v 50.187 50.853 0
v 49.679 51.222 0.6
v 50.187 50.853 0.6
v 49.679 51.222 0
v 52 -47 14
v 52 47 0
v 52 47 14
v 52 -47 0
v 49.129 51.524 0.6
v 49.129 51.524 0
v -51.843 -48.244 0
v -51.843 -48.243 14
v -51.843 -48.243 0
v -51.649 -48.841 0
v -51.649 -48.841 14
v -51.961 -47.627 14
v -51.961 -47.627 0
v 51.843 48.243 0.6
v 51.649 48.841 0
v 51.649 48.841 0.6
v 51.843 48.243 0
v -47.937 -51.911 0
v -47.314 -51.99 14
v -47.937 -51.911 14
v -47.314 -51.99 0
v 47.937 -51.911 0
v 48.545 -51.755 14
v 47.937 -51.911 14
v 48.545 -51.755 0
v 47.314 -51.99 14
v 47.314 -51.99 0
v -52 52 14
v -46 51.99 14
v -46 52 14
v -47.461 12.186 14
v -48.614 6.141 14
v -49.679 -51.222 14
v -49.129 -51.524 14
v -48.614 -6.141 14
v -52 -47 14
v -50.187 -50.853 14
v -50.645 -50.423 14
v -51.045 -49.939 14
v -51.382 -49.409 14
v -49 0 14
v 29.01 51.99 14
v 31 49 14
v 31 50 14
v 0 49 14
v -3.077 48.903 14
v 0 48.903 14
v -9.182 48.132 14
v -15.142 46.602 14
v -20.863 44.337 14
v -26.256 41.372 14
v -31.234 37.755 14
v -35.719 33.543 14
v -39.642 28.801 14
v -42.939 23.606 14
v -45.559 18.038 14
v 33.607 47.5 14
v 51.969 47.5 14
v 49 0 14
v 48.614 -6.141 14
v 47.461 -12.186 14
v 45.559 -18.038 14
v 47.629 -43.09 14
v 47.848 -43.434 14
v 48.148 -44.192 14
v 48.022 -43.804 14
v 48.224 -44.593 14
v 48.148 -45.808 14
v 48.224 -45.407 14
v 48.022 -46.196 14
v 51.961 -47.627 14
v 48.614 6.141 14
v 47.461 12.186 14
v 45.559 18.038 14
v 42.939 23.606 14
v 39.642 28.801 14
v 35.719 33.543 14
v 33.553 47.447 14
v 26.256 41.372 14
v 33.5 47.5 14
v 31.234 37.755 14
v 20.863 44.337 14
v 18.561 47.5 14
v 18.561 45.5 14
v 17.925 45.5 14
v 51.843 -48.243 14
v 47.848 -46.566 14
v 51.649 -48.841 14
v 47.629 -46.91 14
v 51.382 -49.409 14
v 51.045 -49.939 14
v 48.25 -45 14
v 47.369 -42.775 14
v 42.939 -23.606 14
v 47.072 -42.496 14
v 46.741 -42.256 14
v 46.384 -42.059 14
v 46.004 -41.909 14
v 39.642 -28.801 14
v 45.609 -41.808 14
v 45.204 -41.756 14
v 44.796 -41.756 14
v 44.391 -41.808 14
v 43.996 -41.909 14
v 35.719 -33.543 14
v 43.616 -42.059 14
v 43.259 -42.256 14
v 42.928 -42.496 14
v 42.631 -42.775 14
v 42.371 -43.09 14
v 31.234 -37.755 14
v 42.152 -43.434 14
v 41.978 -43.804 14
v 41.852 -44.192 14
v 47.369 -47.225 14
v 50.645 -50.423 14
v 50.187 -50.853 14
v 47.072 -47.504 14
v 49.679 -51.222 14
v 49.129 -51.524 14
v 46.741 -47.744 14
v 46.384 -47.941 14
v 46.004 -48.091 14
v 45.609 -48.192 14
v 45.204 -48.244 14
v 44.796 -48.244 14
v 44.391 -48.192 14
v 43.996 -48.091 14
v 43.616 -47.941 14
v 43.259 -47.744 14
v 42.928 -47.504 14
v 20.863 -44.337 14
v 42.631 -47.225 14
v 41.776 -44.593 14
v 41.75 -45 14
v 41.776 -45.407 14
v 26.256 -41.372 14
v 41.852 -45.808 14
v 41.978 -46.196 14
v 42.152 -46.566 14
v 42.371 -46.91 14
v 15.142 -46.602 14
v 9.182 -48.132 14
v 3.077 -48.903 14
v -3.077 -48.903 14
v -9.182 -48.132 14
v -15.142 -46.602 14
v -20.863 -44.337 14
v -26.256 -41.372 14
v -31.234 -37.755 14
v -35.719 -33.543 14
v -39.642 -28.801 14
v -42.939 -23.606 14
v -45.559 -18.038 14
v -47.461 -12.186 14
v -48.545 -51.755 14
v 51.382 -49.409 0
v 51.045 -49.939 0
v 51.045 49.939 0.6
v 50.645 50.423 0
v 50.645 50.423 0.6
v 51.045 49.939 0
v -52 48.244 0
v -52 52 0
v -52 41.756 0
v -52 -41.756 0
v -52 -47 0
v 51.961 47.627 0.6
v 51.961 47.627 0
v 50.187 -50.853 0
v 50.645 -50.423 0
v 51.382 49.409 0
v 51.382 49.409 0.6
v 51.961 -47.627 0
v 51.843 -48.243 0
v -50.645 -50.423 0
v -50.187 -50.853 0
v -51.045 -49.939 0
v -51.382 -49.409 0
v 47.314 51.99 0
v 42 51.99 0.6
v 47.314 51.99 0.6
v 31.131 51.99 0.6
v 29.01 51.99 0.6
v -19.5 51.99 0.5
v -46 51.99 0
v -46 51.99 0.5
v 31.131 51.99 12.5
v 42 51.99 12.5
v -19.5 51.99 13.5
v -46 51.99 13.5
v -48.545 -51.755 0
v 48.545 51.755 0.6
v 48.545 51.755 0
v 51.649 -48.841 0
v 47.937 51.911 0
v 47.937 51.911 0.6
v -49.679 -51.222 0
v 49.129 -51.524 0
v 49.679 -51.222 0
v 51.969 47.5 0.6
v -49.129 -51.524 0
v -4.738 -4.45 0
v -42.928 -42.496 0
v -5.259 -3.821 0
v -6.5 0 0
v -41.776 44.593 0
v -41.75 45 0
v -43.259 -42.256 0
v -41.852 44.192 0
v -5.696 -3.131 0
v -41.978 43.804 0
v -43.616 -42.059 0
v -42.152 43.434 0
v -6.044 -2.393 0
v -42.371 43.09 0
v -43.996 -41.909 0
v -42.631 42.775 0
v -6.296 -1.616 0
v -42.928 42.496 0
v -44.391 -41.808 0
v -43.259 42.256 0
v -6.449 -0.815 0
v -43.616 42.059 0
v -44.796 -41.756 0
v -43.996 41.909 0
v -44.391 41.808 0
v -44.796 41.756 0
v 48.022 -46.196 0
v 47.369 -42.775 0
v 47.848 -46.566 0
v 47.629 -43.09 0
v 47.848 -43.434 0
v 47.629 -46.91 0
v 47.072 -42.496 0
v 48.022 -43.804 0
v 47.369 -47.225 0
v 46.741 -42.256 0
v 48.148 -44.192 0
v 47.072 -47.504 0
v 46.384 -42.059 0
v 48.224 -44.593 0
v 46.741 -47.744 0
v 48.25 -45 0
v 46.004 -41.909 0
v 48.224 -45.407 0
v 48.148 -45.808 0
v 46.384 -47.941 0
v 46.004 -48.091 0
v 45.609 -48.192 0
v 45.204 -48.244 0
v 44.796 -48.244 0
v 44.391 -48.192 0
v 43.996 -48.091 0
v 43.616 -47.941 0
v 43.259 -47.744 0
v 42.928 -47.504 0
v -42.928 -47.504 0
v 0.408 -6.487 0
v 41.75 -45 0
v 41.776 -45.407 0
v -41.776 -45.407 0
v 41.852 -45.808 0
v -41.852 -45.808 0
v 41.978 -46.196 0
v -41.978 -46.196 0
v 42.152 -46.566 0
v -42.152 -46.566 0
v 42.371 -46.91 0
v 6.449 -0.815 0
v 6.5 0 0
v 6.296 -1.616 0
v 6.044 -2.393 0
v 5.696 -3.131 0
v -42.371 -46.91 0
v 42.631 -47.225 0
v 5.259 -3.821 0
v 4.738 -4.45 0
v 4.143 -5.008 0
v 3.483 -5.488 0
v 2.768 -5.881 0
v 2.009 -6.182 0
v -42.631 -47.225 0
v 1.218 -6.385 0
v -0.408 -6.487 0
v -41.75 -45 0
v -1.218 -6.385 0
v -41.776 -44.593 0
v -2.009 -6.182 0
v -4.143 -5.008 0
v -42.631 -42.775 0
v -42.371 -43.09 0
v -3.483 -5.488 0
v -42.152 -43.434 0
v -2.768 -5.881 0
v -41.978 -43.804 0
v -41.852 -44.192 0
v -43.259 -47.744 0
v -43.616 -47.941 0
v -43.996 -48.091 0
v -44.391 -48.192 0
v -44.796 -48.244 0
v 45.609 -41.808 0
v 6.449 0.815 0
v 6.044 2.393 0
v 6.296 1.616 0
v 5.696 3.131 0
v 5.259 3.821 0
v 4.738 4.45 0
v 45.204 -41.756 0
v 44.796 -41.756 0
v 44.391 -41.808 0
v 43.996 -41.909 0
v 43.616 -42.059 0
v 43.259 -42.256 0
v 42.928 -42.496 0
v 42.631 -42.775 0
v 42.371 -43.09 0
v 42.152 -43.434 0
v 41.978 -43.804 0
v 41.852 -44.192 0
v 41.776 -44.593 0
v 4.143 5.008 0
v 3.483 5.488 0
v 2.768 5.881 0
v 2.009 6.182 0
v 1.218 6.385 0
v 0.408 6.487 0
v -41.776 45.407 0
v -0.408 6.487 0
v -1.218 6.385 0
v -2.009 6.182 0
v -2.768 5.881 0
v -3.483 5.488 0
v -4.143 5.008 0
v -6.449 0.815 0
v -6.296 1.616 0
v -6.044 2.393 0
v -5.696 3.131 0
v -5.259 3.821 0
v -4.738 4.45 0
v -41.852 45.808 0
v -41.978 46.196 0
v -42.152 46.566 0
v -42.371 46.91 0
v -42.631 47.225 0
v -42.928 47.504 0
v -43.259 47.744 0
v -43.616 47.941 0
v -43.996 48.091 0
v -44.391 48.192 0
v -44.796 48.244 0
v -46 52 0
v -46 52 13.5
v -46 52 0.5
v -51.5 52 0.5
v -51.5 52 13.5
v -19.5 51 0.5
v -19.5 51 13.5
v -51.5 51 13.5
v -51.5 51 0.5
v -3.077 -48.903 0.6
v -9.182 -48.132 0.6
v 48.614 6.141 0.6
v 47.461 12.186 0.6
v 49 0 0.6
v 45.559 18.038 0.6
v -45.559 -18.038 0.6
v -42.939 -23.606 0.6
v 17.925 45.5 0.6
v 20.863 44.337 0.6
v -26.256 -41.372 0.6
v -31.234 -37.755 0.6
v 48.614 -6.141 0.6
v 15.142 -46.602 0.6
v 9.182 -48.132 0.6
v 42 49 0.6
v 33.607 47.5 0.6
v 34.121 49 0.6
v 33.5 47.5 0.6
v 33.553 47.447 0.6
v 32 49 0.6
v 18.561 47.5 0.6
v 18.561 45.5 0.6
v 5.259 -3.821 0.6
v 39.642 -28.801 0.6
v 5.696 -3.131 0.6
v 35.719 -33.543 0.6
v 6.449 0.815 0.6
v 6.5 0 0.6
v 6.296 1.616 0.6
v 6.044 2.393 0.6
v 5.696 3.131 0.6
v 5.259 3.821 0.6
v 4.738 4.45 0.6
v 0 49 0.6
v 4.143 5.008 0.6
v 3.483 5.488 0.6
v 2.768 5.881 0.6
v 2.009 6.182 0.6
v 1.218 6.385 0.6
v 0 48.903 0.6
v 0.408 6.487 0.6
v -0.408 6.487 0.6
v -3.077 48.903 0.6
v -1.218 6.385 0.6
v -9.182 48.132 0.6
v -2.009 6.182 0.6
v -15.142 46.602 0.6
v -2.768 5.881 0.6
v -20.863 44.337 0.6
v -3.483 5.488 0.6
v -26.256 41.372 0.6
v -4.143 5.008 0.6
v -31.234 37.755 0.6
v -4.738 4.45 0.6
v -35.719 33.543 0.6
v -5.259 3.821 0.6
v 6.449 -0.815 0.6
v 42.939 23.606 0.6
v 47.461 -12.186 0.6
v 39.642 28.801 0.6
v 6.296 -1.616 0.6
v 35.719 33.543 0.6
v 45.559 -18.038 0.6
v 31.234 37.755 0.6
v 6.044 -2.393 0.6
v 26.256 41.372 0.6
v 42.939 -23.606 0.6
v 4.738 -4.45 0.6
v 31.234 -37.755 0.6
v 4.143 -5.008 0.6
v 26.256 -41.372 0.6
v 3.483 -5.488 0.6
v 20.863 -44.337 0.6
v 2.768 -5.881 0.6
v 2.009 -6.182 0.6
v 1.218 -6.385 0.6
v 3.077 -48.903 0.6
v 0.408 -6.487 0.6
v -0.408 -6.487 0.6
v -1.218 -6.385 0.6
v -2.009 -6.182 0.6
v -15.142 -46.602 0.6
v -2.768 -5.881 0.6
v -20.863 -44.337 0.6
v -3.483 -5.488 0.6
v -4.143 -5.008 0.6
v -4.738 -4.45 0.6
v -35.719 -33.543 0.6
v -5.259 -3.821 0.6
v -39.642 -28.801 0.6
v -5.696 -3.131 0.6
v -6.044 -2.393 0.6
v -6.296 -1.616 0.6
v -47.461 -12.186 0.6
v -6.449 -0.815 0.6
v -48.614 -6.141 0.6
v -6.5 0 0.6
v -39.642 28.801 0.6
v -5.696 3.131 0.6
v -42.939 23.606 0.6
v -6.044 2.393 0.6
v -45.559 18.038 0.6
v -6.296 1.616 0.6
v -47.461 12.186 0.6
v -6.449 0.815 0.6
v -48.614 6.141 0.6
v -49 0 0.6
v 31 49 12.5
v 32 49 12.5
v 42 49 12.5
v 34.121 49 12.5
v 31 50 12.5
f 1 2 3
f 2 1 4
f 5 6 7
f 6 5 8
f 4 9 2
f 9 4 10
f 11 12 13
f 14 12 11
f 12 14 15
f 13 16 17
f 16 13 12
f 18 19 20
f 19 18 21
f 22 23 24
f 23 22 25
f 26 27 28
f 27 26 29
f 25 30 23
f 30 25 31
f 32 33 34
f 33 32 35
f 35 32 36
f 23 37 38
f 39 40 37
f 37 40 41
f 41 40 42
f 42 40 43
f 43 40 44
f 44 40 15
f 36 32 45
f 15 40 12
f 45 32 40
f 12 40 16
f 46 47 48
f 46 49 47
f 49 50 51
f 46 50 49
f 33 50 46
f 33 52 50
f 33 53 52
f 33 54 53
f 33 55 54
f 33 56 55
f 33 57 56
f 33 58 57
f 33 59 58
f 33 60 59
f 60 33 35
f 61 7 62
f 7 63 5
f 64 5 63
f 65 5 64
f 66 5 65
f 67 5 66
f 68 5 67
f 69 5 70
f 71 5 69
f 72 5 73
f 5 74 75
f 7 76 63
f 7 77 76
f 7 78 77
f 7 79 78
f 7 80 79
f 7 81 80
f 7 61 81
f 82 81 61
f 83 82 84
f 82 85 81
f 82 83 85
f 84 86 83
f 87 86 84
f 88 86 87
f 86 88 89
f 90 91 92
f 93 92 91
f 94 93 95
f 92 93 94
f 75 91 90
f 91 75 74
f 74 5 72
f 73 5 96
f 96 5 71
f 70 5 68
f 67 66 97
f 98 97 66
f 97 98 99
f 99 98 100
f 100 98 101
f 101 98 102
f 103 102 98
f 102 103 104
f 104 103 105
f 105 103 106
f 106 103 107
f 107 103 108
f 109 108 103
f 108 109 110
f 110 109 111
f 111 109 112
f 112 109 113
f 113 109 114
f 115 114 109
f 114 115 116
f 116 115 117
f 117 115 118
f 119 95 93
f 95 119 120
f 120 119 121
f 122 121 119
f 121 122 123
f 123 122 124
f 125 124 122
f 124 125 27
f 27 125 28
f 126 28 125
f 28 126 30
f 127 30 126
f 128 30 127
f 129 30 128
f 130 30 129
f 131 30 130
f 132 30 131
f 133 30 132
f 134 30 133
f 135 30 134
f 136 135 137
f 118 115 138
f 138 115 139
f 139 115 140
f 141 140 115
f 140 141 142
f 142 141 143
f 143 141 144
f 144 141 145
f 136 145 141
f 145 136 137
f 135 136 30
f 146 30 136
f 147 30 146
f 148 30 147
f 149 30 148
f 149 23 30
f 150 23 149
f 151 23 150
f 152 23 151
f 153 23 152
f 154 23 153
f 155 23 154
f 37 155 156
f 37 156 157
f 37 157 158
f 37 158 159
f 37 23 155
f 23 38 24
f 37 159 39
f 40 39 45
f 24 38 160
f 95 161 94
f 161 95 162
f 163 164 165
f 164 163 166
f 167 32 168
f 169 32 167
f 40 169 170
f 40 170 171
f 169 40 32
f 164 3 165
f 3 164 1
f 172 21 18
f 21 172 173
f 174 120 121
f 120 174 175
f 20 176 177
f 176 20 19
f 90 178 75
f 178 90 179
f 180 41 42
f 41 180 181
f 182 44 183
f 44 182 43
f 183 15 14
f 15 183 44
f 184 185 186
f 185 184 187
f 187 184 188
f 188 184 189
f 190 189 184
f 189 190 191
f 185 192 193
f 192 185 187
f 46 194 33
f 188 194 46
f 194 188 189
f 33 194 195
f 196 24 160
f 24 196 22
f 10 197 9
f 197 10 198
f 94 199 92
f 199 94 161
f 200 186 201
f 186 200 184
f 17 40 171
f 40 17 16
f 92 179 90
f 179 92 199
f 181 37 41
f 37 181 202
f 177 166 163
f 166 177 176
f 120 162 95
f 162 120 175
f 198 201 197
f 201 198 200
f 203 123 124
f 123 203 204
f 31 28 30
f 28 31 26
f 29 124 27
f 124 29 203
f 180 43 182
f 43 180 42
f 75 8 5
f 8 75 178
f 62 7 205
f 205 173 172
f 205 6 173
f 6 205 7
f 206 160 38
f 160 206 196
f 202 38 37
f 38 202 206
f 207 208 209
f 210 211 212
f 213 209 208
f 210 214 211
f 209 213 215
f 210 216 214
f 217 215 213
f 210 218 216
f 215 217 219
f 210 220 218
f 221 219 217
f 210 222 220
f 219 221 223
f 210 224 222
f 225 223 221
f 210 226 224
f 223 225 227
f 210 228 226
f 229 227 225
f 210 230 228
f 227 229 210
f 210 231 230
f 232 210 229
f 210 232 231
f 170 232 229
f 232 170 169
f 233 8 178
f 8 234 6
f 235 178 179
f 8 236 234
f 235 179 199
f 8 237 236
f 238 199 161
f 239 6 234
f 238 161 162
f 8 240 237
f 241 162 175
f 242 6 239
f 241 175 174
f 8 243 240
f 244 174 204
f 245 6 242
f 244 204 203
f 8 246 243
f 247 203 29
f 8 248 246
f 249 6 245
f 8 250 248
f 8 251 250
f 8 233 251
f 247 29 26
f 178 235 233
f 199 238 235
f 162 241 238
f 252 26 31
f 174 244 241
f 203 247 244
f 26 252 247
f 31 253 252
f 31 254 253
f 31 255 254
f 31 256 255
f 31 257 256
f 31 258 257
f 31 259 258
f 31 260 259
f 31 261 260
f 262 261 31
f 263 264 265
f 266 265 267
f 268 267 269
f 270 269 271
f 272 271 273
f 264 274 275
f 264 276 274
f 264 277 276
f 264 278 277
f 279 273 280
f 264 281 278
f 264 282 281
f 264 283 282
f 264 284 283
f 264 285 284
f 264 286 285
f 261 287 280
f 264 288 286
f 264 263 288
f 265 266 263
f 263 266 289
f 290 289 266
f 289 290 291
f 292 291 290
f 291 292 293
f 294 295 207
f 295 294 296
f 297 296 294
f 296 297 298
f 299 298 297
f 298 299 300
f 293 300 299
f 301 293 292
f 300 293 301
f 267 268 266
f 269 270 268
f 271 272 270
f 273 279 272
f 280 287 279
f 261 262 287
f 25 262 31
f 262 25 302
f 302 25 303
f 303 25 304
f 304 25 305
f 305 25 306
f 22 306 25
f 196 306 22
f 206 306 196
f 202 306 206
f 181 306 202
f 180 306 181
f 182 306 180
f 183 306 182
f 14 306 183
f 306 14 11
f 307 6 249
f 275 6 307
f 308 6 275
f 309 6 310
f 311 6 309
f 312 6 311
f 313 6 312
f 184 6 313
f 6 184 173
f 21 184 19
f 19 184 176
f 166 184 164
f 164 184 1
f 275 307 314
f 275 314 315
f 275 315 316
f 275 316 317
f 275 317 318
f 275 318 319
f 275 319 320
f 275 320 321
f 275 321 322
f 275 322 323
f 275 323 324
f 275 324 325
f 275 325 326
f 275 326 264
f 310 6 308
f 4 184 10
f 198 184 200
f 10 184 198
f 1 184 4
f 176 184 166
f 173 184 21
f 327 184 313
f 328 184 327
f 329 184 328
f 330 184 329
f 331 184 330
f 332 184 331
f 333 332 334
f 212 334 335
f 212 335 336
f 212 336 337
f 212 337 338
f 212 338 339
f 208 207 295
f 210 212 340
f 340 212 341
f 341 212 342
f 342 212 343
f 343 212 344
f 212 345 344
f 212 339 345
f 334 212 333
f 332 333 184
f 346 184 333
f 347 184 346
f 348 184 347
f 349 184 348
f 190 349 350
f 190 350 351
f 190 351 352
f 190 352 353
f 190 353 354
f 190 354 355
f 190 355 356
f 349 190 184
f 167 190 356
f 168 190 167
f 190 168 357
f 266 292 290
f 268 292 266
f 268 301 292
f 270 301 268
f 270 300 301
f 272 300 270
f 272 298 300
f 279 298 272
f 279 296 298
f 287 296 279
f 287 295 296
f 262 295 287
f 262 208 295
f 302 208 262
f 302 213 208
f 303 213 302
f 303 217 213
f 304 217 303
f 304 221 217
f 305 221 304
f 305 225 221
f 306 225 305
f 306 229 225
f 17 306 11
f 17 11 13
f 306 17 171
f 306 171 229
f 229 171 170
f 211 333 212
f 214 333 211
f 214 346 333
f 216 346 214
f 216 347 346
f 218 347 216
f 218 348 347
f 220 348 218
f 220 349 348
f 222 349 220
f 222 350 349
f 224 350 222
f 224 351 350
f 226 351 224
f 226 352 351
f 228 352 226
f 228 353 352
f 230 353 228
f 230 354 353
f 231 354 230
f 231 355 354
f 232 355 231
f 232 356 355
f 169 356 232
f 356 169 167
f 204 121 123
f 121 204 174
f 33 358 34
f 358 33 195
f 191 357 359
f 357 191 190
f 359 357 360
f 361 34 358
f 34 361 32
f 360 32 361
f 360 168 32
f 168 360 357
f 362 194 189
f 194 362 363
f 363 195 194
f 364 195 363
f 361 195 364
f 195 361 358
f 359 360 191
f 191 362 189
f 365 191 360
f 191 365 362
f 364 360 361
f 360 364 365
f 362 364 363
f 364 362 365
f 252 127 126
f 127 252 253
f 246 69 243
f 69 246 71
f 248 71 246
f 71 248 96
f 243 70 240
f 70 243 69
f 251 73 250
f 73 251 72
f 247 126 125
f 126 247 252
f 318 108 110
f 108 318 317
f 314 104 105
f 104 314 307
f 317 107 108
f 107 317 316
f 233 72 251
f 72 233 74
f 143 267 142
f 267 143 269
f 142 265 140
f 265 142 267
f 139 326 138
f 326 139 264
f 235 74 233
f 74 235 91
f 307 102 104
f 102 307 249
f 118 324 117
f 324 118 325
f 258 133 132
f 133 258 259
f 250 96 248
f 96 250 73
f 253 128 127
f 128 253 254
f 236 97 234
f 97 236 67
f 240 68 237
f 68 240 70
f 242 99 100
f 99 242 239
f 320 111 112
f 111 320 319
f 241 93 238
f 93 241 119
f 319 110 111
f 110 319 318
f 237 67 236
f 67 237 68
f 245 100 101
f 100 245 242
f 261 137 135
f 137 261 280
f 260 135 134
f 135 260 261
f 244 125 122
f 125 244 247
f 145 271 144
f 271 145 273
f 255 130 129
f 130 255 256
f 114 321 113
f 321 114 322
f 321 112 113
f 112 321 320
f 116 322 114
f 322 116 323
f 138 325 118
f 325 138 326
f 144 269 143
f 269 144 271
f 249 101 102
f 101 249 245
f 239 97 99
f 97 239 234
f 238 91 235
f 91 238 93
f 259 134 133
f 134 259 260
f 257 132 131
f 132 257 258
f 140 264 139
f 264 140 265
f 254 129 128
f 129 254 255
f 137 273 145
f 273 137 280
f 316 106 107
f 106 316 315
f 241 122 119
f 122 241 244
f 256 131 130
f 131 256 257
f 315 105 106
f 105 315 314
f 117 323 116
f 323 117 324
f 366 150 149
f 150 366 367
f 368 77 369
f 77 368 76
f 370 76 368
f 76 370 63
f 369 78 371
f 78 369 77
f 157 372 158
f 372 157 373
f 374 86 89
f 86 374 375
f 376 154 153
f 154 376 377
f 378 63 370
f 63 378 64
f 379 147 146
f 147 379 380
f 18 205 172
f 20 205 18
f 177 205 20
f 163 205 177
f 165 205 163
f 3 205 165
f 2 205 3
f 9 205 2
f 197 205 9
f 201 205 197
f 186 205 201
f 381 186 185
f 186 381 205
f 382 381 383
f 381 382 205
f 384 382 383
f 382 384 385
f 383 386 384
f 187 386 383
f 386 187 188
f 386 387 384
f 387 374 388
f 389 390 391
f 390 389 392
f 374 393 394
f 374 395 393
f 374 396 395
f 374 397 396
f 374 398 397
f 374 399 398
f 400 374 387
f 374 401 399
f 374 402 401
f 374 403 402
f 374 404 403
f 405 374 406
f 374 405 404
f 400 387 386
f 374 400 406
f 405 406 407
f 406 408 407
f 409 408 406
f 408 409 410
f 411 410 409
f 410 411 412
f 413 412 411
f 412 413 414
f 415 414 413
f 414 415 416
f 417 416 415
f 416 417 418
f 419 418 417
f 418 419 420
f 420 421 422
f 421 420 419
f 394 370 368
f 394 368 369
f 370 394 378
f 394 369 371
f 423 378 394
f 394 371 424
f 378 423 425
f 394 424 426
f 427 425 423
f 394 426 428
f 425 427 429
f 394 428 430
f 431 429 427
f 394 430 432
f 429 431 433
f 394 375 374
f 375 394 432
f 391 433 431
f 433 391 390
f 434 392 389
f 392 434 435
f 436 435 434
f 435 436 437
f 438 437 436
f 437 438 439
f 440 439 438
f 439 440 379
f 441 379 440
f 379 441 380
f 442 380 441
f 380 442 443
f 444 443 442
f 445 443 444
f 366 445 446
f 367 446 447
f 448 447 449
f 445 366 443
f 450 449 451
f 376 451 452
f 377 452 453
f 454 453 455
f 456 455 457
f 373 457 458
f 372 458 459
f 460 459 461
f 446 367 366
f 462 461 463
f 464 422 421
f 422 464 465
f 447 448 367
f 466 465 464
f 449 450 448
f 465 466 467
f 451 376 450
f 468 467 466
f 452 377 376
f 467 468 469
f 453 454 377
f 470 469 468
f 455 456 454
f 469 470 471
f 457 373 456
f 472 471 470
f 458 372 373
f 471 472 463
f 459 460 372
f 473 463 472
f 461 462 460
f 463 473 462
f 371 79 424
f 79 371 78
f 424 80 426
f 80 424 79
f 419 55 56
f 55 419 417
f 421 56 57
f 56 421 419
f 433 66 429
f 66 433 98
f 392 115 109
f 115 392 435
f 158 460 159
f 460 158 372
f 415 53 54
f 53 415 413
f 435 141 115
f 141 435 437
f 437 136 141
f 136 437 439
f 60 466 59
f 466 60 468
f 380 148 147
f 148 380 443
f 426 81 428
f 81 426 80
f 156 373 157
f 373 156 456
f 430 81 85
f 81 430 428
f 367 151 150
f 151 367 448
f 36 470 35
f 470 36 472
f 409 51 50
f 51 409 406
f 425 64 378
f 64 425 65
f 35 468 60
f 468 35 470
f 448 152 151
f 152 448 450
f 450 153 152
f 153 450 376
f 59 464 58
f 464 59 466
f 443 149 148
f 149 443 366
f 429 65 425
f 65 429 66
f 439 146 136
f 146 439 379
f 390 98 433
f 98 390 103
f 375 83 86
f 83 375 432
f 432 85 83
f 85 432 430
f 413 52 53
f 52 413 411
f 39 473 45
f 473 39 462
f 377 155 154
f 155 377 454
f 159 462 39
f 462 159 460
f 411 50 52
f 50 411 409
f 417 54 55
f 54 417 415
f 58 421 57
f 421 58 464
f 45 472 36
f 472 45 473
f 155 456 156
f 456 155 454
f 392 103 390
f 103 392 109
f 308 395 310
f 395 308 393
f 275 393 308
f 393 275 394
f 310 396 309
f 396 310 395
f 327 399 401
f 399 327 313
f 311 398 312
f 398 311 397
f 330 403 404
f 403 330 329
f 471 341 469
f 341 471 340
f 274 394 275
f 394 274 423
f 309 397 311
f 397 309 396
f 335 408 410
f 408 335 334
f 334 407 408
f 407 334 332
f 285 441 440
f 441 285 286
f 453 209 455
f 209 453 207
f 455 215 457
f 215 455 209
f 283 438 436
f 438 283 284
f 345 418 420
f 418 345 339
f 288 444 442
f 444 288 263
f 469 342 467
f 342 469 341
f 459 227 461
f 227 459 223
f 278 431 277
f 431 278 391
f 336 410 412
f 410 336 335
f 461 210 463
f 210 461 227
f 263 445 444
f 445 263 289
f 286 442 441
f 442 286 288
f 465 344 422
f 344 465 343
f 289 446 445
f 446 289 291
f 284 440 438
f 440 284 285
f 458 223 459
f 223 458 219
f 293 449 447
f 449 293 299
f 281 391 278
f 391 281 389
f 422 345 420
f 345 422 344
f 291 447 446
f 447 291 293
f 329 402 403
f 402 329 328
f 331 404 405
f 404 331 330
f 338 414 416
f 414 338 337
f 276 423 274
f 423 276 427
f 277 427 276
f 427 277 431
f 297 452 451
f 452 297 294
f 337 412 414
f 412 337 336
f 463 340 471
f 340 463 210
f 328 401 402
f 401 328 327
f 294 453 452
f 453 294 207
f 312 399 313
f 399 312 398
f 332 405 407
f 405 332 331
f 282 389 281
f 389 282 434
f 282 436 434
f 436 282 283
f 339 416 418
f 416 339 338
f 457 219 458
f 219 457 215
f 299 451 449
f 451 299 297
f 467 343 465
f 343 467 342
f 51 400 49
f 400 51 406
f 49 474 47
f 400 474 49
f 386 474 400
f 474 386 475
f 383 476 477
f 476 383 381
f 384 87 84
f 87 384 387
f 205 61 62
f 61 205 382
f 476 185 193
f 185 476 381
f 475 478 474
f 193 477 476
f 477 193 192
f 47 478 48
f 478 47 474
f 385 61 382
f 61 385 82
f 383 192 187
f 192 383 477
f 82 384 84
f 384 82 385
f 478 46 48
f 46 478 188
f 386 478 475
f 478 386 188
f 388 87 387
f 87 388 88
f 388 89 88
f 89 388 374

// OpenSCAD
$fn = 50;


difference() {
	union() {
		hull() {
			translate(v = [-47.0000000000, 47.0000000000, 0]) {
				cylinder(h = 14, r = 5);
			}
			translate(v = [47.0000000000, 47.0000000000, 0]) {
				cylinder(h = 14, r = 5);
			}
			translate(v = [-47.0000000000, -47.0000000000, 0]) {
				cylinder(h = 14, r = 5);
			}
			translate(v = [47.0000000000, -47.0000000000, 0]) {
				cylinder(h = 14, r = 5);
			}
		}
		translate(v = [-52.0000000000, 46.0000000000, 0]) {
			cube(size = [6, 6, 14]);
		}
	}
	union() {
		translate(v = [-52.5000000000, -45.0000000000, -250.0000000000]) {
			rotate(a = [0, 0, 0]) {
				difference() {
					union() {
						hull() {
							translate(v = [7.5000000000, 0, 0]) {
								cylinder(h = 250, r = 3.2500000000, r1 = 3.2500000000, r2 = 3.2500000000);
							}
							translate(v = [-7.5000000000, 0, 0]) {
								cylinder(h = 250, r = 3.2500000000, r1 = 3.2500000000, r2 = 3.2500000000);
							}
						}
					}
					union();
				}
			}
		}
		translate(v = [-52.5000000000, 45.0000000000, -250.0000000000]) {
			rotate(a = [0, 0, 0]) {
				difference() {
					union() {
						hull() {
							translate(v = [7.5000000000, 0, 0]) {
								cylinder(h = 250, r = 3.2500000000, r1 = 3.2500000000, r2 = 3.2500000000);
							}
							translate(v = [-7.5000000000, 0, 0]) {
								cylinder(h = 250, r = 3.2500000000, r1 = 3.2500000000, r2 = 3.2500000000);
							}
						}
					}
					union();
				}
			}
		}
		translate(v = [-51.5000000000, 51.0000000000, 0.5000000000]) {
			cube(size = [32, 1, 13.0000000000]);
		}
		translate(v = [45.0000000000, -45.0000000000, -50.0000000000]) {
			cylinder(h = 100, r = 3.2500000000);
		}
		translate(v = [0, 0, 0.6000000000]) {
			cylinder(h = 16.4000000000, r = 49.0000000000);
		}
		translate(v = [0, 0, -7.0000000000]) {
			cylinder(h = 14, r = 6.5000000000);
		}
		translate(v = [0.0000000000, 47.5000000000, 0.6000000000]) {
			cube(size = [52.0000000000, 1.5000000000, 16.4000000000]);
		}
		translate(v = [42.0000000000, 47.5000000000, 0.6000000000]) {
			cube(size = [10, 4.5000000000, 16.4000000000]);
		}
		translate(v = [31.0000000000, 47.5000000000, 12.5000000000]) {
			cube(size = [21, 4.5000000000, 1.5000000000]);
		}
		translate(v = [28.2500000000, 52.7500000000, 0.6000000000]) {
			rotate(a = [0, 0, -45]) {
				cube(size = [7.5000000000, 1.5000000000, 16.4000000000]);
			}
		}
		translate(v = [11.0610000000, 45.5000000000, 0.6000000000]) {
			cube(size = [7.5000000000, 2, 13.4000000000]);
		}
	}
}
